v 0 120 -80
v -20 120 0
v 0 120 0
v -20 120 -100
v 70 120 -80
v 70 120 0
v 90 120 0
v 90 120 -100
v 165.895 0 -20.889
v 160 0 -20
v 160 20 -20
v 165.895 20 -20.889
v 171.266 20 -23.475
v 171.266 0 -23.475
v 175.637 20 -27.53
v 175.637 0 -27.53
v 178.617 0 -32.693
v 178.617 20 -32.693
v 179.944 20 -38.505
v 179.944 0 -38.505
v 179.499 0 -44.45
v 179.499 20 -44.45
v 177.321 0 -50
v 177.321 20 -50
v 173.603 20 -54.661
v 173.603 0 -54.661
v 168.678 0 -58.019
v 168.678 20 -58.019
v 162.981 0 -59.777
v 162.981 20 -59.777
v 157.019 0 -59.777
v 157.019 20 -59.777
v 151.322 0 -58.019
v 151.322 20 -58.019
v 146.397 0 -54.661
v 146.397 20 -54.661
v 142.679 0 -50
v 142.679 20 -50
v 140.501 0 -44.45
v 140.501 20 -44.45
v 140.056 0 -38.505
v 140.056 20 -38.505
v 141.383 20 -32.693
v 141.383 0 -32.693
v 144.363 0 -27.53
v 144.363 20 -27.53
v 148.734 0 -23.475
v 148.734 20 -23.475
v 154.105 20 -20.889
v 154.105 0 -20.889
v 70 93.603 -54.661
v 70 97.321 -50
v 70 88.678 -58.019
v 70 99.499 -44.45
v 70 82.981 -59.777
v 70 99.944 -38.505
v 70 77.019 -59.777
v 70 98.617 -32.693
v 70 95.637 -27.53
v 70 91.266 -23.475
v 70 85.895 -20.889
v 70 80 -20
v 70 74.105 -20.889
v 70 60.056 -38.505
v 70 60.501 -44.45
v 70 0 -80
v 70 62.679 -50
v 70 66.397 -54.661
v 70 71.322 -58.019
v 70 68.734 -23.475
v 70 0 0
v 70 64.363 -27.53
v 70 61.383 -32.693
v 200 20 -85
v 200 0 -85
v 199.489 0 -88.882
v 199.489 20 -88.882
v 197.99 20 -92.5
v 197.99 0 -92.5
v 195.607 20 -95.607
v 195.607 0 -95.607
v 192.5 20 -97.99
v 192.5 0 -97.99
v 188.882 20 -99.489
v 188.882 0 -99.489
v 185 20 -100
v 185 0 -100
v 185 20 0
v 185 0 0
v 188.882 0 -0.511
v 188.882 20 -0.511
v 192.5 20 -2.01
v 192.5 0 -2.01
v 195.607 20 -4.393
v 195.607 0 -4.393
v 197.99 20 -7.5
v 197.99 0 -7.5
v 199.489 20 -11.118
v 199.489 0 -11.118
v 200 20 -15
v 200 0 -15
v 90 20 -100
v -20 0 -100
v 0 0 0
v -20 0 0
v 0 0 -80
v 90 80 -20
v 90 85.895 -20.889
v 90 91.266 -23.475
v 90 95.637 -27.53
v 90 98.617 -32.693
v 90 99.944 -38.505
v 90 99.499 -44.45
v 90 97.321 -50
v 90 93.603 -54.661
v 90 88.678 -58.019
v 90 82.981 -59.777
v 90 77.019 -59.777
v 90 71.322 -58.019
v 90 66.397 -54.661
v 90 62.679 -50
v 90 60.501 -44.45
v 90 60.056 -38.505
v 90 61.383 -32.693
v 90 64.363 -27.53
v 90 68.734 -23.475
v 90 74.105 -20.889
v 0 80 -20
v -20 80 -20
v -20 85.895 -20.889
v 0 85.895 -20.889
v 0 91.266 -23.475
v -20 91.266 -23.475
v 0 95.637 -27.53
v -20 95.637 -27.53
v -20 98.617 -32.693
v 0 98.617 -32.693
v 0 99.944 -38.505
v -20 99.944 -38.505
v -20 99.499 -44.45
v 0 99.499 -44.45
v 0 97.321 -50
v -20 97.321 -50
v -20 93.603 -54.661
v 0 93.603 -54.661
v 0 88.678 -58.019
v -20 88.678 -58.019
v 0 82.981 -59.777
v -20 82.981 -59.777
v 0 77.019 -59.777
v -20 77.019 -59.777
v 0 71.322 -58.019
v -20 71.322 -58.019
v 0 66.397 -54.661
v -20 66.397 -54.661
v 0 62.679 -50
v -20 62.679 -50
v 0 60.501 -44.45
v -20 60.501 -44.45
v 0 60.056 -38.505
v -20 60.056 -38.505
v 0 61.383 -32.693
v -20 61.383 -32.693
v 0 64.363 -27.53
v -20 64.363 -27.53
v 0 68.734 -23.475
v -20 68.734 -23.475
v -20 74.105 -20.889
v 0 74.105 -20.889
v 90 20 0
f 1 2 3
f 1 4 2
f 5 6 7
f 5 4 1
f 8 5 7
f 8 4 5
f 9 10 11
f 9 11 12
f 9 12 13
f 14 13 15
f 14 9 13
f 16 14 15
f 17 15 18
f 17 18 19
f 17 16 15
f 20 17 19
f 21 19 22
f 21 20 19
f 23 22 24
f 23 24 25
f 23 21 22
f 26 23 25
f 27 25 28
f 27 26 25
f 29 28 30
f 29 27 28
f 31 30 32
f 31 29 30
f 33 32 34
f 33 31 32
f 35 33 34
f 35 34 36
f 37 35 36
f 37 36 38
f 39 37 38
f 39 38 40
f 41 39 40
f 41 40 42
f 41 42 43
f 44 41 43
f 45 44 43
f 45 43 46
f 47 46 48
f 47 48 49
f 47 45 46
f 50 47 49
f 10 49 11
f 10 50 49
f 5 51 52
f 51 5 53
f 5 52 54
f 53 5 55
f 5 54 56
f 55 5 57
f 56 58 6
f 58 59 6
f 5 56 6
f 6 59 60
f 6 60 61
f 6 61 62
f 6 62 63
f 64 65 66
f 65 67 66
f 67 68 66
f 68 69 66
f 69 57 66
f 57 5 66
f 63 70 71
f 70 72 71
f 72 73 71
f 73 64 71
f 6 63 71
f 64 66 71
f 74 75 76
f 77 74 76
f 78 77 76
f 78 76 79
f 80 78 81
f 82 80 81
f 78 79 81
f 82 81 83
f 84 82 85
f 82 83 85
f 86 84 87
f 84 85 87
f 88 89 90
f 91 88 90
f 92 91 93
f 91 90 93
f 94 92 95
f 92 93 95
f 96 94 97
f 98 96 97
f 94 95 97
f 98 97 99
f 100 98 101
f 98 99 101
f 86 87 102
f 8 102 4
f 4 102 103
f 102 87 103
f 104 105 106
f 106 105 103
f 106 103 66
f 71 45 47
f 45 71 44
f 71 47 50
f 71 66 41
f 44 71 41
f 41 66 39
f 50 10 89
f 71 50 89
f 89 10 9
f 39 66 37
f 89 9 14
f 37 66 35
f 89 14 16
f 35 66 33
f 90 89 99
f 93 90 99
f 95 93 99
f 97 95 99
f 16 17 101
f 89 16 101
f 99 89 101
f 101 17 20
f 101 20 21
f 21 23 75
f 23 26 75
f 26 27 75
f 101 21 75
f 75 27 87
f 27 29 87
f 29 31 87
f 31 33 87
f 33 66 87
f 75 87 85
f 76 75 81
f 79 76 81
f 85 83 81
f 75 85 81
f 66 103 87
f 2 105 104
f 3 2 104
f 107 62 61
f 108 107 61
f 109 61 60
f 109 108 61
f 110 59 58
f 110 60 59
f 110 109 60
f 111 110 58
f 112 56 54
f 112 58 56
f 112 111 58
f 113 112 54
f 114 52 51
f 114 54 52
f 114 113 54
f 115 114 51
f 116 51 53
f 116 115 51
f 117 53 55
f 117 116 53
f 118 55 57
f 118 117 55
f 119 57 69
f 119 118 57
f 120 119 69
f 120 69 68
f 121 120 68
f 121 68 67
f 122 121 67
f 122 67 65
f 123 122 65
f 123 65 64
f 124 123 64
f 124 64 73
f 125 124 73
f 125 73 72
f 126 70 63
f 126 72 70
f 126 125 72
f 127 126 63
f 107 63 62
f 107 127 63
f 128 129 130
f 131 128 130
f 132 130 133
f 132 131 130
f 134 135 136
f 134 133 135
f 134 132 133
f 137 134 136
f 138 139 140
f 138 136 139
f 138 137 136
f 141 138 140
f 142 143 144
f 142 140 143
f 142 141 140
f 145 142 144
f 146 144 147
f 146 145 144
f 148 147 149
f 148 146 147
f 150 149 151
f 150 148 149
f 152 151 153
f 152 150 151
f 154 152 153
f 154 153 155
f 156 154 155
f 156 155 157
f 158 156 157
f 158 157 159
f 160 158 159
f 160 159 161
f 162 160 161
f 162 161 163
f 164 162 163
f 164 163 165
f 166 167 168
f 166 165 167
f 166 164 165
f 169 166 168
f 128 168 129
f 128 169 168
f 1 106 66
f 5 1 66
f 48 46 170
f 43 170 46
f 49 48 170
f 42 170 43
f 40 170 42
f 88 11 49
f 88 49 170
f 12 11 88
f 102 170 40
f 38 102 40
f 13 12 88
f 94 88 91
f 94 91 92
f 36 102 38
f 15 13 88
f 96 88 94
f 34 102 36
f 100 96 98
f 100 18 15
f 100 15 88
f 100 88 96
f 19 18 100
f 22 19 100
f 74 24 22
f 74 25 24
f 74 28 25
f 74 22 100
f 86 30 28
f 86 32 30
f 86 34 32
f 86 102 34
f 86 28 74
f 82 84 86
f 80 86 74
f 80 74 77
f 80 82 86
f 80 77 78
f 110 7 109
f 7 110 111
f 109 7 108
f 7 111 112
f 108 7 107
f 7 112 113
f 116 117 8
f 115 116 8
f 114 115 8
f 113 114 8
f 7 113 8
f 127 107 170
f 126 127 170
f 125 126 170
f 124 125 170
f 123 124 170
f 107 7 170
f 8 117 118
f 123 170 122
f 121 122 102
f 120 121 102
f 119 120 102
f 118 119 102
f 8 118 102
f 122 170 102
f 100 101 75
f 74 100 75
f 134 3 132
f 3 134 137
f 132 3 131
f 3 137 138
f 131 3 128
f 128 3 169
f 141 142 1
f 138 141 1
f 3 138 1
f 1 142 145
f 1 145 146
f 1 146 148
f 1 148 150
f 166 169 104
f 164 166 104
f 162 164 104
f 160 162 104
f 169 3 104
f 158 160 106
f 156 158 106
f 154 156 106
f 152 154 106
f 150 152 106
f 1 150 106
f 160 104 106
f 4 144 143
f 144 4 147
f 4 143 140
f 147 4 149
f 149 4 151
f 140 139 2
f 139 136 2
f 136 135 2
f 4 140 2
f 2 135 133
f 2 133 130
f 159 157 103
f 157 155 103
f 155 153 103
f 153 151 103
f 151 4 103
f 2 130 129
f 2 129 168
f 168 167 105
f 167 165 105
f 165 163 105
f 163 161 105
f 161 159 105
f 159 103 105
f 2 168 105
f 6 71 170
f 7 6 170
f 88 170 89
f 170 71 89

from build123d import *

# Parameters (mm, degrees)
EXTRUDE_1_DEPTH          = 120
SKETCH_1_4_R             = 20
EXTRUDE_1_2_DEPTH        = 20
CUT_EXTRUDE_1_DEPTH      = 270.814751265
CUT_EXTRUDE_1_DEPTH_BACK = 270.814751265
SKETCH_2_R               = 20


# Read off the part's stored shape, not the designer's step: 拉伸-薄壁1
with BuildPart() as part:
    # Extrude 1 outline → Extrude 1 (new body)
    with BuildSketch(Plane(origin=(0, 0, 0), x_dir=(1, 0, 0), z_dir=(0, 1, 0))):
        Polygon((-20, 0), (0, 0), (0, 80), (70, 80), (70, 0), (90, 0), (90, 100), (-20, 100), align=None)
    extrude(amount=EXTRUDE_1_DEPTH)

    # 草图1<4> → Extrude 1 2 (add)
    with BuildSketch(Plane(origin=(0, 0, 0), x_dir=(1, 0, 0), z_dir=(0, 1, 0))):
        with BuildLine():
            Line((90, 0), (185, 0))
            ThreePointArc((185, 0), (195.606601718, 4.393398282), (200, 15))
            Line((200, 15), (200, 85))
            ThreePointArc((200, 85), (195.606601718, 95.606601718), (185, 100))
            Line((185, 100), (90, 100))
            Line((90, 100), (90, 0))
        make_face()
        with Locations(Location((160, 40, 0), (0, 0, 270))):
            Circle(SKETCH_1_4_R, mode=Mode.SUBTRACT)
    extrude(amount=EXTRUDE_1_2_DEPTH)

    # 草图2 → 切除-拉伸1 (cut, two sides: drawn at the far end of the back side and taken through both)
    with BuildSketch(Plane.ZY.offset(20).offset(-CUT_EXTRUDE_1_DEPTH_BACK)):
        with Locations((-40, 80)):
            Circle(SKETCH_2_R)
    extrude(amount=CUT_EXTRUDE_1_DEPTH + CUT_EXTRUDE_1_DEPTH_BACK, mode=Mode.SUBTRACT)


solid = part.part
